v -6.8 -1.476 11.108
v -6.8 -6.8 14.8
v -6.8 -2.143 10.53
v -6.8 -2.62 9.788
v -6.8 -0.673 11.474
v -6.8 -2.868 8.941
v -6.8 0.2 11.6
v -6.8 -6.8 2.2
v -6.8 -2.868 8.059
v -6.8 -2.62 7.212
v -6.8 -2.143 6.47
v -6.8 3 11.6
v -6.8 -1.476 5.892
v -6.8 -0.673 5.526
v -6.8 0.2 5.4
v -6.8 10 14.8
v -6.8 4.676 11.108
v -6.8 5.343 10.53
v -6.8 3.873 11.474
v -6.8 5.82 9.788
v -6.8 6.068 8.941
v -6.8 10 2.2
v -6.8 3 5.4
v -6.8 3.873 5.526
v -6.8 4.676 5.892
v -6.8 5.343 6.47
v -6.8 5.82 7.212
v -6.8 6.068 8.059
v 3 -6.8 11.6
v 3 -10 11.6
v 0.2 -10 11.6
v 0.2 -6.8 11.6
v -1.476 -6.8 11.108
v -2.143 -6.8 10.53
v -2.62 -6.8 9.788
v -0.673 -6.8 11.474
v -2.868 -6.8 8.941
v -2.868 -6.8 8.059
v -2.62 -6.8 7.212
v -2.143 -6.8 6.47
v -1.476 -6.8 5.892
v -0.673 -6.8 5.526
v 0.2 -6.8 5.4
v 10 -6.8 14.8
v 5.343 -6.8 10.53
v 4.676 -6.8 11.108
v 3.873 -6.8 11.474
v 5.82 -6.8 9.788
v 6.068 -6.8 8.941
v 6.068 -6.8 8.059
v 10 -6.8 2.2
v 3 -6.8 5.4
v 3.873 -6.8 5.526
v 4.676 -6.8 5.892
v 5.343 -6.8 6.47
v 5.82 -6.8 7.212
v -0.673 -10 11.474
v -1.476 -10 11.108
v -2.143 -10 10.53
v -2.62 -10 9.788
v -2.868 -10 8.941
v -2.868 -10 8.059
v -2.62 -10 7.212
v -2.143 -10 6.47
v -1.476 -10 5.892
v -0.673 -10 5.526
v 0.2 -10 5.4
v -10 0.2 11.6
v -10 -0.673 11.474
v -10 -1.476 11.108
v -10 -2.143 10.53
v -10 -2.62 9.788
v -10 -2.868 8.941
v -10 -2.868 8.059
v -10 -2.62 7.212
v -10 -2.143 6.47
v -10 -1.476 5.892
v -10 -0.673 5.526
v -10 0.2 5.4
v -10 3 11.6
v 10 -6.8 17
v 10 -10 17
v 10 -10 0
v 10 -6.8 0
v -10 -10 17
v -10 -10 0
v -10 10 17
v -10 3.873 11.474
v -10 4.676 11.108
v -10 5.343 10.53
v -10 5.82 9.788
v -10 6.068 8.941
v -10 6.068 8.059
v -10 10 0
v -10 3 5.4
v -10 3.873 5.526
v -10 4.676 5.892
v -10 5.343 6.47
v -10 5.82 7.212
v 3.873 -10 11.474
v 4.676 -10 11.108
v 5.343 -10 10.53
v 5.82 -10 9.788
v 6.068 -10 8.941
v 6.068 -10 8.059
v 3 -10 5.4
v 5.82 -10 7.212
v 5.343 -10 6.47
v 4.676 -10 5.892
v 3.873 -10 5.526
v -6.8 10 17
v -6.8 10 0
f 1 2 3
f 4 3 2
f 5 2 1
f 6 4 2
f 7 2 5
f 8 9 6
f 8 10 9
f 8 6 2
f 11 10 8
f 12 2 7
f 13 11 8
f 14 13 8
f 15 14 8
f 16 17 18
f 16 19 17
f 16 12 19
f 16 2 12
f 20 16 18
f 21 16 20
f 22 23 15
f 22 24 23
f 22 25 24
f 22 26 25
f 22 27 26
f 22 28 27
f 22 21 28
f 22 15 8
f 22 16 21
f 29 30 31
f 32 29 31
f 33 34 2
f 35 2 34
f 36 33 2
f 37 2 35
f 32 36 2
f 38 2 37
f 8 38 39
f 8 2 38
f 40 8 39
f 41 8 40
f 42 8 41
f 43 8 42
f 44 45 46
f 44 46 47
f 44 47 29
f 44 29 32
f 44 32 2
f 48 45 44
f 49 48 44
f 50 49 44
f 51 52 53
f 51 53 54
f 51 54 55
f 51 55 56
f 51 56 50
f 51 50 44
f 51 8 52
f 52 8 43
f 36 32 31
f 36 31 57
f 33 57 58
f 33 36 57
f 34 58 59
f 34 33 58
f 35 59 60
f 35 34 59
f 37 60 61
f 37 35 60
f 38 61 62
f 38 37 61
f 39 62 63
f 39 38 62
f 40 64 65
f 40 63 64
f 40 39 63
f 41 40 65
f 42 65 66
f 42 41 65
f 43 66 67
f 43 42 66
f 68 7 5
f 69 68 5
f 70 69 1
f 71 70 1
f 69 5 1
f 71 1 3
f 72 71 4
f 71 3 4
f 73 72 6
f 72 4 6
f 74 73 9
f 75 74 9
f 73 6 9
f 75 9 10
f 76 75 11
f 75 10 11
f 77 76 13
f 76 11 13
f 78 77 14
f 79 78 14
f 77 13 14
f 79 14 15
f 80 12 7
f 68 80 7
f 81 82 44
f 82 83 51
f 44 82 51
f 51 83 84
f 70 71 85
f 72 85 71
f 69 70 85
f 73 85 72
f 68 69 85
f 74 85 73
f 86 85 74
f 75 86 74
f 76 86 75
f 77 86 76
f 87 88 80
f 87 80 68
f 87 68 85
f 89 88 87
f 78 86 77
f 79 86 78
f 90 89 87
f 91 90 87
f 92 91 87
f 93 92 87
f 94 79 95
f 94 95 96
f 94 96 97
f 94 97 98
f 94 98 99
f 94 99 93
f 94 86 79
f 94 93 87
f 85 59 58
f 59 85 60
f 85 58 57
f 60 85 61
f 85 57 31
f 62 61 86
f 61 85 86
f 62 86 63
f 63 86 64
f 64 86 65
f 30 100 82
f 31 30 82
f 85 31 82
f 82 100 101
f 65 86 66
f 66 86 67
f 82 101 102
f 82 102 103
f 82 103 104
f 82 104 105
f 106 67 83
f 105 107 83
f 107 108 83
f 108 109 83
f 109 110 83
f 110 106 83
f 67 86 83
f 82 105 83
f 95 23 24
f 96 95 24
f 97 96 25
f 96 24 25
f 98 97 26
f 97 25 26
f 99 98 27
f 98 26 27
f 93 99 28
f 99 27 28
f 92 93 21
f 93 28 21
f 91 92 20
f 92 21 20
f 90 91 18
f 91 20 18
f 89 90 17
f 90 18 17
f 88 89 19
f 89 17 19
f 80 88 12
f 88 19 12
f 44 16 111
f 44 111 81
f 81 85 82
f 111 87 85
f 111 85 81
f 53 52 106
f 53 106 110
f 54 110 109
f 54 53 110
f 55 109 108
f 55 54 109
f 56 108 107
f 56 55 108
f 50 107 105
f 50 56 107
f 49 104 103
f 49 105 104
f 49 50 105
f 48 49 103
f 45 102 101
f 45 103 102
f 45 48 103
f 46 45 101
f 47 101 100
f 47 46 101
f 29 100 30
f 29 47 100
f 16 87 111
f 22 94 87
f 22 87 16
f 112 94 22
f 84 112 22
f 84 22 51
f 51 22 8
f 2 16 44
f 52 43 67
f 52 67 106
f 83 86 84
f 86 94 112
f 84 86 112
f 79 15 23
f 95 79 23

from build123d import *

# Parameters (mm, degrees)
SKETCH_1_W               = 20
SKETCH_1_H               = 20
EXTRUDE_1_DEPTH          = 17
SKETCH_2_W               = 16.8
SKETCH_2_H               = 12.6
CUT_EXTRUDE_1_DEPTH      = 16.8
CUT_EXTRUDE_2_DEPTH      = 16.8
CUT_EXTRUDE_2_DEPTH_BACK = 16.8
CUT_EXTRUDE_3_DEPTH      = 16.8


with BuildPart() as part:
    # 草图1 → 凸台-拉伸1 (new body)
    with BuildSketch(Plane.XY):
        Rectangle(SKETCH_1_W, SKETCH_1_H)
    extrude(amount=EXTRUDE_1_DEPTH)

    # 草图2 → 切除-拉伸1 (cut)
    with BuildSketch(Plane(origin=(0, 10, 0), x_dir=(1, 0, 0), z_dir=(0, 1, 0))):
        with Locations((1.6, -8.5)):
            Rectangle(SKETCH_2_W, SKETCH_2_H)
    extrude(amount=-CUT_EXTRUDE_1_DEPTH, mode=Mode.SUBTRACT)

    # 草图3 → 切除-拉伸2 (cut, two sides: drawn at the far end of the back side and taken through both)
    with BuildSketch(Plane.XY.offset(2.2).offset(-CUT_EXTRUDE_2_DEPTH_BACK)):
        Polygon((-6.8, 10), (10, -6.8), (10, 10), align=None)
    extrude(amount=CUT_EXTRUDE_2_DEPTH + CUT_EXTRUDE_2_DEPTH_BACK, mode=Mode.SUBTRACT)

    # 草图4 → 切除-拉伸3 (cut)
    with BuildSketch(Plane(origin=(-6.8, 0, 0), x_dir=(0, 0, -1), z_dir=(1, 0, 0))):
        with BuildLine():
            Line((-5.4, 0.2), (-5.4, 3))
            ThreePointArc((-5.4, 3), (-8.5, 6.1), (-11.6, 3))
            Line((-11.6, 3), (-11.6, 0.2))
            ThreePointArc((-11.6, 0.2), (-8.5, -2.9), (-5.4, 0.2))
        make_face()
    cut_extrude_3 = extrude(amount=-CUT_EXTRUDE_3_DEPTH, mode=Mode.SUBTRACT)

    # 镜向1: 切除-拉伸3 across plane
    add(cut_extrude_3.mirror(Plane(origin=(0, 0, 0), x_dir=(0, 0, 1), z_dir=(0.7071067811865479, -0.7071067811865471, 0))), mode=Mode.SUBTRACT)


solid = part.part
